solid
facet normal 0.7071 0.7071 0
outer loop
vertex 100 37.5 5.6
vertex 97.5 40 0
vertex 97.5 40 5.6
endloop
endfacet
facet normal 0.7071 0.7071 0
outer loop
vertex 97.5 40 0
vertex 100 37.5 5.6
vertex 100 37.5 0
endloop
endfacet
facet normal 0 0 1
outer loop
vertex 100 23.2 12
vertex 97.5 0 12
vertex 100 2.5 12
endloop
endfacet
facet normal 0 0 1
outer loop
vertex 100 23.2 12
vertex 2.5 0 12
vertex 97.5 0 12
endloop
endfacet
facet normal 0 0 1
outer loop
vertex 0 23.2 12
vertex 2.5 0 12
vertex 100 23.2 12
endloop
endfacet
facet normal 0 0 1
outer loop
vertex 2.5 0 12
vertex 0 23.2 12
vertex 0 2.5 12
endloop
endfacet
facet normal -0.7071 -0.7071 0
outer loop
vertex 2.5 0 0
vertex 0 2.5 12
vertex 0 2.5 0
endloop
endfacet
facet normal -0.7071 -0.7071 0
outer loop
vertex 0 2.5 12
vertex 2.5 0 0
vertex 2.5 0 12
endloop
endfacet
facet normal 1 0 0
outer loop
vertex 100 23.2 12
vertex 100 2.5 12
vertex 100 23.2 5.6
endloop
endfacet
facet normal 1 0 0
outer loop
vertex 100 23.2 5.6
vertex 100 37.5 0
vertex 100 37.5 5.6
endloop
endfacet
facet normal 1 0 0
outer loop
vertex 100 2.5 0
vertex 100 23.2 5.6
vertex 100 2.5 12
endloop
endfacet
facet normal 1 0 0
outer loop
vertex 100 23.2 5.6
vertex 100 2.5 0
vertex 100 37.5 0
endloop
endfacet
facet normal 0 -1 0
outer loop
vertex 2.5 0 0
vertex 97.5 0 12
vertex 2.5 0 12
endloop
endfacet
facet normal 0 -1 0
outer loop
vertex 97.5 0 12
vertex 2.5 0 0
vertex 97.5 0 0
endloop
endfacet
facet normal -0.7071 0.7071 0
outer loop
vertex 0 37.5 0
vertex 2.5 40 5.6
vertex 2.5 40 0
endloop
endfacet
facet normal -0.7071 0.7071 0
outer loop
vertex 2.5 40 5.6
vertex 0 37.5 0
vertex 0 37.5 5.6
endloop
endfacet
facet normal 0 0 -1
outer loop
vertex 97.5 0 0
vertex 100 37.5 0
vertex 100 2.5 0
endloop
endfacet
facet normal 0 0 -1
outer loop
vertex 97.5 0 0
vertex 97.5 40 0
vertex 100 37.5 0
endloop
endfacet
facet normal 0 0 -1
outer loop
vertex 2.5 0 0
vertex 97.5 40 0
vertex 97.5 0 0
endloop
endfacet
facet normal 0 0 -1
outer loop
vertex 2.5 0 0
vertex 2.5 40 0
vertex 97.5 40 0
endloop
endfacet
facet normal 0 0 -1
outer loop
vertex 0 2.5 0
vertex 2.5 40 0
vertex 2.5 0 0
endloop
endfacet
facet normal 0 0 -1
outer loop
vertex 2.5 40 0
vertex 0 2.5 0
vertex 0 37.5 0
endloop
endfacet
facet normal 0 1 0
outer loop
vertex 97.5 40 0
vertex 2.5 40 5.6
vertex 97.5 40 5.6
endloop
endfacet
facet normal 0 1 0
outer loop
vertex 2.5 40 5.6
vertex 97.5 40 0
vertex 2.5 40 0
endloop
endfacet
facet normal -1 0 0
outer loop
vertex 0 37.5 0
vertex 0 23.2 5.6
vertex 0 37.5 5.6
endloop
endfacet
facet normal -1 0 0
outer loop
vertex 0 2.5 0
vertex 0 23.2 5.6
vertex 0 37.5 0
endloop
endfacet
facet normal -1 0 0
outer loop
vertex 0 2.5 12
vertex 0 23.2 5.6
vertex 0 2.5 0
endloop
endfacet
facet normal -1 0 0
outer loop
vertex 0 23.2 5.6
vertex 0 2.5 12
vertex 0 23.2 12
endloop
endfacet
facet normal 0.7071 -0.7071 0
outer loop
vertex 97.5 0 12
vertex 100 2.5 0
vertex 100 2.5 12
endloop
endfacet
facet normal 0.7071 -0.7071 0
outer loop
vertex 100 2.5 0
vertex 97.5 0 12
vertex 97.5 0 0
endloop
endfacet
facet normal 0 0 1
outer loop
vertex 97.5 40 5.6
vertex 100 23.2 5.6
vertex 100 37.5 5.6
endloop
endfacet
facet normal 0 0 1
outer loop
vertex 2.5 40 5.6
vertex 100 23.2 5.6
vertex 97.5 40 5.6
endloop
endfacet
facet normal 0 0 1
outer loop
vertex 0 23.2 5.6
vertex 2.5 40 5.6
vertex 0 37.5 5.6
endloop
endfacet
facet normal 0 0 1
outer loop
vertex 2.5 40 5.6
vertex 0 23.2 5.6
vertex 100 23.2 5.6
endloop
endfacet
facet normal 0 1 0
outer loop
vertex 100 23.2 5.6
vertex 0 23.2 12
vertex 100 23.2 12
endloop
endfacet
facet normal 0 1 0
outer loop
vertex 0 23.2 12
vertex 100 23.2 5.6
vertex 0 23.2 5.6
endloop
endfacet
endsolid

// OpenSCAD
$fn = 32;

// ----------------------------------------------------------------------
// Stepped bar: sidestep, 100 x 40 x 12/5.6 mm
// ----------------------------------------------------------------------

// --- parameters (mm) ---
bar_l = 100;              // bar length, X
bar_w = 40;               // bar width, Y
plate_t = 12;             // thickness of the thick zone, Z
thin_t = 5.6;             // thickness of the thin zone
corner_c = 2.5;           // corner chamfer of the bar
step_cut = 6.4;           // material removed from the thin zone
ledge_y = 23.2;           // start of the ledge from the front edge
depth_1 = 6.4;            // depth of cut 1 from the top face

profile = [[2.5, 0], [97.5, 0], [100, 2.5], [100, 37.5], [97.5, 40], [2.5, 40], [0, 37.5], [0, 2.5]];  // primary outline, 8 points, counter clockwise
void_1 = [[-1, 23.2], [101, 23.2], [101, 41], [-1, 41]];  // ledge cut along one edge, 4 points

// --- the one profile operation ---
difference() {
  linear_extrude(height = plate_t) polygon(points = profile);
  translate([0, 0, plate_t - depth_1])
    linear_extrude(height = depth_1 + 1) polygon(points = void_1);
}
